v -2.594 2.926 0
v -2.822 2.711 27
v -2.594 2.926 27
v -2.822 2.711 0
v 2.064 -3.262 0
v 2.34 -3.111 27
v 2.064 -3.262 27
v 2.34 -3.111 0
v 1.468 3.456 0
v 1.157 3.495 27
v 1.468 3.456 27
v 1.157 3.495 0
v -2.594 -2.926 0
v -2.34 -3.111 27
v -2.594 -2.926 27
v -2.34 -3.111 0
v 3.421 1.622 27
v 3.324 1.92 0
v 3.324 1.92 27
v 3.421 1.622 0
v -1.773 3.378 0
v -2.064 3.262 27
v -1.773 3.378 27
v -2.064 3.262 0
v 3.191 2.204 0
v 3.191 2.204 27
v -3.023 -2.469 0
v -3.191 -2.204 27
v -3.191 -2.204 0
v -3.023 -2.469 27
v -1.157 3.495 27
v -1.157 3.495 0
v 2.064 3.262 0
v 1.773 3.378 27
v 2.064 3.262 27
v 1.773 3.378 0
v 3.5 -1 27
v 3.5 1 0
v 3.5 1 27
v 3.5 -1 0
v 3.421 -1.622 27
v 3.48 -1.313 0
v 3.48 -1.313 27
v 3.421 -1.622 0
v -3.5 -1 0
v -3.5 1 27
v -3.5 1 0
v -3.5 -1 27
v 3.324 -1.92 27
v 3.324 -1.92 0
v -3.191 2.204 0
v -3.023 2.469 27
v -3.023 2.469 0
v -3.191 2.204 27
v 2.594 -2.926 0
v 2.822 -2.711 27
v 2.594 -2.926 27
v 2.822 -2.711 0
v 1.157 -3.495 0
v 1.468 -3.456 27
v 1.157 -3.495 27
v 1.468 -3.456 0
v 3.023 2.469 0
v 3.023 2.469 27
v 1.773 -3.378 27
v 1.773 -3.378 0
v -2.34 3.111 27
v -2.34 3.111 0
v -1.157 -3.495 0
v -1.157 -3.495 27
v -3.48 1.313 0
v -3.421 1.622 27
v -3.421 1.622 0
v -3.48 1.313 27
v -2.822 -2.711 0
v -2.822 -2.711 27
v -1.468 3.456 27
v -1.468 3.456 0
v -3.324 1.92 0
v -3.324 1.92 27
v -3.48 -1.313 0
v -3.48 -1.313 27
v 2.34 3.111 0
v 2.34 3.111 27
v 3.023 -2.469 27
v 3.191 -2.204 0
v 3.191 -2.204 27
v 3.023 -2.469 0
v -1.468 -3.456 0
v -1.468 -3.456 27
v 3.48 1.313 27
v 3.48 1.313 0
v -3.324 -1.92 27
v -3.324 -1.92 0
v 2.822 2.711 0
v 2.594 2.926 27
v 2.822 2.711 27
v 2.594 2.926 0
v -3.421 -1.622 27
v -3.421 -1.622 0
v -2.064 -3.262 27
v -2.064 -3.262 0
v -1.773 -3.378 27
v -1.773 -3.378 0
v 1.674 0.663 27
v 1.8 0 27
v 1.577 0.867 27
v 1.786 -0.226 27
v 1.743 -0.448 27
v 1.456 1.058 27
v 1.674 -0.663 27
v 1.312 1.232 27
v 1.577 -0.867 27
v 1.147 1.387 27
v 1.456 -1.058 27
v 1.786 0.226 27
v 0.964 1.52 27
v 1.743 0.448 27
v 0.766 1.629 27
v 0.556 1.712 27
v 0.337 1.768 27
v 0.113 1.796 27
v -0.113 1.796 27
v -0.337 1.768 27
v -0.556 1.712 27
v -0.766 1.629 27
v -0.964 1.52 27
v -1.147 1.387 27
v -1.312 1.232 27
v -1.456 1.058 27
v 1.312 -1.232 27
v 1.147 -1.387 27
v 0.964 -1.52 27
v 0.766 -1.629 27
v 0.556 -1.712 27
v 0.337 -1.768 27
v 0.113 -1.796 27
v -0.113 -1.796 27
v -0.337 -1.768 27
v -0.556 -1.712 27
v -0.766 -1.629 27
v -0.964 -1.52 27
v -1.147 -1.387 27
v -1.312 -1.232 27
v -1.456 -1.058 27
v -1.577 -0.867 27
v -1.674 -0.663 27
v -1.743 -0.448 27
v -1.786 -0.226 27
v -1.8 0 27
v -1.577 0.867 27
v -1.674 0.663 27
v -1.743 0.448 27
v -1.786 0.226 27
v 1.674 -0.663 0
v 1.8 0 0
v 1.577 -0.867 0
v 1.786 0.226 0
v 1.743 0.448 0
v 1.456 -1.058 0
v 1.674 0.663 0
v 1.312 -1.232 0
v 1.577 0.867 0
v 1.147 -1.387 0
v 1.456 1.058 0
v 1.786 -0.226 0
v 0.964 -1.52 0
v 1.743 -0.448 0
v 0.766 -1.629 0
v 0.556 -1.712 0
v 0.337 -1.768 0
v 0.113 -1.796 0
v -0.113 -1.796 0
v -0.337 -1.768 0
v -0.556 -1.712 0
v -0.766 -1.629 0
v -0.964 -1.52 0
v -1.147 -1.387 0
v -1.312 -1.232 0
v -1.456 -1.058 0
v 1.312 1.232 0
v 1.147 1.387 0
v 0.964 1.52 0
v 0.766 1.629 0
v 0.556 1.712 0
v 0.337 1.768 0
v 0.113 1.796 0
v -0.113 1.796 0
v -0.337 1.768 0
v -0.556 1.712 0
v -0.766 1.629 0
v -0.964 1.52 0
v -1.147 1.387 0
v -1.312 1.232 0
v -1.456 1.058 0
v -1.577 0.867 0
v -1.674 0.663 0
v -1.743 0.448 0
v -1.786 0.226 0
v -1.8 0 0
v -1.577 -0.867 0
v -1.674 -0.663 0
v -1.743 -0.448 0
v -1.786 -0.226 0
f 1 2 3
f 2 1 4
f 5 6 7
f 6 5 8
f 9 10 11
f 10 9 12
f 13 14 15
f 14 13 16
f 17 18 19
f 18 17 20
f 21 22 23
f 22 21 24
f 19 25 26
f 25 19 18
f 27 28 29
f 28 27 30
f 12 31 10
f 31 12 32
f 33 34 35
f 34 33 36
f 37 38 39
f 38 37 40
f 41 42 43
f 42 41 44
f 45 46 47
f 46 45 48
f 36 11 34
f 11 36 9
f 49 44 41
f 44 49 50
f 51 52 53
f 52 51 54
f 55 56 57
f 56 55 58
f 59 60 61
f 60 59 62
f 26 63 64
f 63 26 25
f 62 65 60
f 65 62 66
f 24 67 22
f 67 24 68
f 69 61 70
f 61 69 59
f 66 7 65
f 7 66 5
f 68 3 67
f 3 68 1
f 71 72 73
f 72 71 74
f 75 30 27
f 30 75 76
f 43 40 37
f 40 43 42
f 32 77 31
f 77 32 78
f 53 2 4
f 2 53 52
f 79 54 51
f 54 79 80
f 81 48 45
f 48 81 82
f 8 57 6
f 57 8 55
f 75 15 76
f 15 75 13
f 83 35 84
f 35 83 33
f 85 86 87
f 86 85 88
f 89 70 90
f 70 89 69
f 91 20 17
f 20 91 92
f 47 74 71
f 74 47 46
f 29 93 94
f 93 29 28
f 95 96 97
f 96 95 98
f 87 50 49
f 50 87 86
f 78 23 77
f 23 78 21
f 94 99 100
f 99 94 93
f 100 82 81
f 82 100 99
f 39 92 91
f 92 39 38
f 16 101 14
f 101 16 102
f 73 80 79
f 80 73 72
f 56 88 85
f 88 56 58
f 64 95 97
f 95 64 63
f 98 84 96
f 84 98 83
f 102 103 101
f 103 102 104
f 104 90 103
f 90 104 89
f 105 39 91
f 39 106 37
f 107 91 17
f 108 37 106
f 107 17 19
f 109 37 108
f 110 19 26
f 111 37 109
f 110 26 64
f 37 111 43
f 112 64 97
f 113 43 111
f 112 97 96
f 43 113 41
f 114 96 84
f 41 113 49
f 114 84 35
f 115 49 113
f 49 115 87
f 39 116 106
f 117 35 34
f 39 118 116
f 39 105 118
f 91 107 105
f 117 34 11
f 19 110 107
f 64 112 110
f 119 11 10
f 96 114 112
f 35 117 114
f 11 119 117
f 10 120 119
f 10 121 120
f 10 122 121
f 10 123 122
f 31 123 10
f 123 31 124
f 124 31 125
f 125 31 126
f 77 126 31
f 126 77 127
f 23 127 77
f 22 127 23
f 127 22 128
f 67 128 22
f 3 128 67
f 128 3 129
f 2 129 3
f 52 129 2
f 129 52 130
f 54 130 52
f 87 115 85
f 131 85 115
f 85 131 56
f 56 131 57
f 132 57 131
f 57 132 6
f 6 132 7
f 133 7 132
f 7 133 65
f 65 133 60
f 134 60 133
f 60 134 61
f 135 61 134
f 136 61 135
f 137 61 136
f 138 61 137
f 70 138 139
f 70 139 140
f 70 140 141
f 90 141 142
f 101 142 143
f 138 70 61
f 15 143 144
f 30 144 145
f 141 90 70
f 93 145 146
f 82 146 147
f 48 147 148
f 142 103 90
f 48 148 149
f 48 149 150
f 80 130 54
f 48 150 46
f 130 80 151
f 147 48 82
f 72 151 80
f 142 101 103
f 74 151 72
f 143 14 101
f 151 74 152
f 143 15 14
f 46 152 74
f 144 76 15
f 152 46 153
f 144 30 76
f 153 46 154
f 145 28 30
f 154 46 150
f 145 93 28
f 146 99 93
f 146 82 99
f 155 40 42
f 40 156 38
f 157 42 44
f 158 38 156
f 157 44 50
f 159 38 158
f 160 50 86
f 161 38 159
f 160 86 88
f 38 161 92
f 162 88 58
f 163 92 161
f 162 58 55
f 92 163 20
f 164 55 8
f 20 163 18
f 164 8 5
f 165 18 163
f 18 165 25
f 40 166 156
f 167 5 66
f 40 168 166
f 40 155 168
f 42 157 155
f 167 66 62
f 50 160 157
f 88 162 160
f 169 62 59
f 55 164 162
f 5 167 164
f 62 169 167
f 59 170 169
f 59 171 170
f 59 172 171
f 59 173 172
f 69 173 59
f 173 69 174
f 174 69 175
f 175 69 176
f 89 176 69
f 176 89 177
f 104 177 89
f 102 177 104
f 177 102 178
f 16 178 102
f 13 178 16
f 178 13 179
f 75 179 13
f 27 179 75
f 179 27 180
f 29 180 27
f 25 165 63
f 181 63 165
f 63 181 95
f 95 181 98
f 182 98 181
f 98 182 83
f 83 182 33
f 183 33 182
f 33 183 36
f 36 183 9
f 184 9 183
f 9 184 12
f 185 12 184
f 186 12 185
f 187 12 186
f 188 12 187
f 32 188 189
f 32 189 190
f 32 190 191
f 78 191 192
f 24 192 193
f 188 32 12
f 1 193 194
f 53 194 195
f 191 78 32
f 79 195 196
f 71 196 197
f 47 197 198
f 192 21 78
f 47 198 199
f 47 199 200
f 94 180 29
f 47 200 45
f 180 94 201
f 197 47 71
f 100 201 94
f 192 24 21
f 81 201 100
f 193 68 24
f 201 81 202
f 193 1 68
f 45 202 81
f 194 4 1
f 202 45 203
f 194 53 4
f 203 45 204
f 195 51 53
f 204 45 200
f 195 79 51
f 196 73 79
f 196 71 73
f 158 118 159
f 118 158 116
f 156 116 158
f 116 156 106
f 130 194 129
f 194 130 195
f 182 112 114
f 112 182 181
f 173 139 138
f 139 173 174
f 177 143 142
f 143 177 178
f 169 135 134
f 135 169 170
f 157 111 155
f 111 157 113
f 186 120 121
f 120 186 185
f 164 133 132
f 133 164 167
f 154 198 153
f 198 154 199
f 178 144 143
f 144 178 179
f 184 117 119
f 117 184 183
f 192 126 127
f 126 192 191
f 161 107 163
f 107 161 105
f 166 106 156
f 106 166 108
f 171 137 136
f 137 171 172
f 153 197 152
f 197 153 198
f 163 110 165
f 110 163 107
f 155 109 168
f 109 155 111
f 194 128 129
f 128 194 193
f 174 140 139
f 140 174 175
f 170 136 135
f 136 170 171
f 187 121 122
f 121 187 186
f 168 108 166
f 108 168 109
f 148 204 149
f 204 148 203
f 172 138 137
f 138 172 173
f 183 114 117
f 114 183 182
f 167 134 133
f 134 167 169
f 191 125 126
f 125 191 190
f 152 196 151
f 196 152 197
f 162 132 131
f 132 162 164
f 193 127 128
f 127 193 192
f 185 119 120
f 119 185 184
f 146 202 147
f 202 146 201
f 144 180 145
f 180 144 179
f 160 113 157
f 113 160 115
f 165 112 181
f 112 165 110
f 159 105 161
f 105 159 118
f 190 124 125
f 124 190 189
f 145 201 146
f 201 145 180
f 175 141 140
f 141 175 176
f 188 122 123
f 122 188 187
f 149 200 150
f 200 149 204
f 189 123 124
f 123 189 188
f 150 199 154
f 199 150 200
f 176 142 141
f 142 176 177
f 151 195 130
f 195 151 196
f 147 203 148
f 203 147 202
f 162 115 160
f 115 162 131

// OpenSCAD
$fn = 50;


difference() {
	union() {
		translate(v = [0, 0, 0]) {
			rotate(a = [0, 0, 0]) {
				hull() {
					translate(v = [-1.0000000000, 1.0000000000, 0]) {
						rotate(a = [0, 0, 0]) {
							translate(v = [0, 0, 0]) {
								rotate(a = [0, 0, 0]) {
									cylinder(h = 27, r = 2.5000000000);
								}
							}
						}
					}
					translate(v = [1.0000000000, 1.0000000000, 0]) {
						rotate(a = [0, 0, 0]) {
							translate(v = [0, 0, 0]) {
								rotate(a = [0, 0, 0]) {
									cylinder(h = 27, r = 2.5000000000);
								}
							}
						}
					}
					translate(v = [-1.0000000000, -1.0000000000, 0]) {
						rotate(a = [0, 0, 0]) {
							translate(v = [0, 0, 0]) {
								rotate(a = [0, 0, 0]) {
									cylinder(h = 27, r = 2.5000000000);
								}
							}
						}
					}
					translate(v = [1.0000000000, -1.0000000000, 0]) {
						rotate(a = [0, 0, 0]) {
							translate(v = [0, 0, 0]) {
								rotate(a = [0, 0, 0]) {
									cylinder(h = 27, r = 2.5000000000);
								}
							}
						}
					}
				}
			}
		}
	}
	union() {
		translate(v = [0.0000000000, 0.0000000000, 0]) {
			rotate(a = [0, 0, 0]) {
				translate(v = [0, 0, -50]) {
					rotate(a = [0, 0, 0]) {
						cylinder(h = 100, r = 1.8000000000);
					}
				}
			}
		}
	}
}
